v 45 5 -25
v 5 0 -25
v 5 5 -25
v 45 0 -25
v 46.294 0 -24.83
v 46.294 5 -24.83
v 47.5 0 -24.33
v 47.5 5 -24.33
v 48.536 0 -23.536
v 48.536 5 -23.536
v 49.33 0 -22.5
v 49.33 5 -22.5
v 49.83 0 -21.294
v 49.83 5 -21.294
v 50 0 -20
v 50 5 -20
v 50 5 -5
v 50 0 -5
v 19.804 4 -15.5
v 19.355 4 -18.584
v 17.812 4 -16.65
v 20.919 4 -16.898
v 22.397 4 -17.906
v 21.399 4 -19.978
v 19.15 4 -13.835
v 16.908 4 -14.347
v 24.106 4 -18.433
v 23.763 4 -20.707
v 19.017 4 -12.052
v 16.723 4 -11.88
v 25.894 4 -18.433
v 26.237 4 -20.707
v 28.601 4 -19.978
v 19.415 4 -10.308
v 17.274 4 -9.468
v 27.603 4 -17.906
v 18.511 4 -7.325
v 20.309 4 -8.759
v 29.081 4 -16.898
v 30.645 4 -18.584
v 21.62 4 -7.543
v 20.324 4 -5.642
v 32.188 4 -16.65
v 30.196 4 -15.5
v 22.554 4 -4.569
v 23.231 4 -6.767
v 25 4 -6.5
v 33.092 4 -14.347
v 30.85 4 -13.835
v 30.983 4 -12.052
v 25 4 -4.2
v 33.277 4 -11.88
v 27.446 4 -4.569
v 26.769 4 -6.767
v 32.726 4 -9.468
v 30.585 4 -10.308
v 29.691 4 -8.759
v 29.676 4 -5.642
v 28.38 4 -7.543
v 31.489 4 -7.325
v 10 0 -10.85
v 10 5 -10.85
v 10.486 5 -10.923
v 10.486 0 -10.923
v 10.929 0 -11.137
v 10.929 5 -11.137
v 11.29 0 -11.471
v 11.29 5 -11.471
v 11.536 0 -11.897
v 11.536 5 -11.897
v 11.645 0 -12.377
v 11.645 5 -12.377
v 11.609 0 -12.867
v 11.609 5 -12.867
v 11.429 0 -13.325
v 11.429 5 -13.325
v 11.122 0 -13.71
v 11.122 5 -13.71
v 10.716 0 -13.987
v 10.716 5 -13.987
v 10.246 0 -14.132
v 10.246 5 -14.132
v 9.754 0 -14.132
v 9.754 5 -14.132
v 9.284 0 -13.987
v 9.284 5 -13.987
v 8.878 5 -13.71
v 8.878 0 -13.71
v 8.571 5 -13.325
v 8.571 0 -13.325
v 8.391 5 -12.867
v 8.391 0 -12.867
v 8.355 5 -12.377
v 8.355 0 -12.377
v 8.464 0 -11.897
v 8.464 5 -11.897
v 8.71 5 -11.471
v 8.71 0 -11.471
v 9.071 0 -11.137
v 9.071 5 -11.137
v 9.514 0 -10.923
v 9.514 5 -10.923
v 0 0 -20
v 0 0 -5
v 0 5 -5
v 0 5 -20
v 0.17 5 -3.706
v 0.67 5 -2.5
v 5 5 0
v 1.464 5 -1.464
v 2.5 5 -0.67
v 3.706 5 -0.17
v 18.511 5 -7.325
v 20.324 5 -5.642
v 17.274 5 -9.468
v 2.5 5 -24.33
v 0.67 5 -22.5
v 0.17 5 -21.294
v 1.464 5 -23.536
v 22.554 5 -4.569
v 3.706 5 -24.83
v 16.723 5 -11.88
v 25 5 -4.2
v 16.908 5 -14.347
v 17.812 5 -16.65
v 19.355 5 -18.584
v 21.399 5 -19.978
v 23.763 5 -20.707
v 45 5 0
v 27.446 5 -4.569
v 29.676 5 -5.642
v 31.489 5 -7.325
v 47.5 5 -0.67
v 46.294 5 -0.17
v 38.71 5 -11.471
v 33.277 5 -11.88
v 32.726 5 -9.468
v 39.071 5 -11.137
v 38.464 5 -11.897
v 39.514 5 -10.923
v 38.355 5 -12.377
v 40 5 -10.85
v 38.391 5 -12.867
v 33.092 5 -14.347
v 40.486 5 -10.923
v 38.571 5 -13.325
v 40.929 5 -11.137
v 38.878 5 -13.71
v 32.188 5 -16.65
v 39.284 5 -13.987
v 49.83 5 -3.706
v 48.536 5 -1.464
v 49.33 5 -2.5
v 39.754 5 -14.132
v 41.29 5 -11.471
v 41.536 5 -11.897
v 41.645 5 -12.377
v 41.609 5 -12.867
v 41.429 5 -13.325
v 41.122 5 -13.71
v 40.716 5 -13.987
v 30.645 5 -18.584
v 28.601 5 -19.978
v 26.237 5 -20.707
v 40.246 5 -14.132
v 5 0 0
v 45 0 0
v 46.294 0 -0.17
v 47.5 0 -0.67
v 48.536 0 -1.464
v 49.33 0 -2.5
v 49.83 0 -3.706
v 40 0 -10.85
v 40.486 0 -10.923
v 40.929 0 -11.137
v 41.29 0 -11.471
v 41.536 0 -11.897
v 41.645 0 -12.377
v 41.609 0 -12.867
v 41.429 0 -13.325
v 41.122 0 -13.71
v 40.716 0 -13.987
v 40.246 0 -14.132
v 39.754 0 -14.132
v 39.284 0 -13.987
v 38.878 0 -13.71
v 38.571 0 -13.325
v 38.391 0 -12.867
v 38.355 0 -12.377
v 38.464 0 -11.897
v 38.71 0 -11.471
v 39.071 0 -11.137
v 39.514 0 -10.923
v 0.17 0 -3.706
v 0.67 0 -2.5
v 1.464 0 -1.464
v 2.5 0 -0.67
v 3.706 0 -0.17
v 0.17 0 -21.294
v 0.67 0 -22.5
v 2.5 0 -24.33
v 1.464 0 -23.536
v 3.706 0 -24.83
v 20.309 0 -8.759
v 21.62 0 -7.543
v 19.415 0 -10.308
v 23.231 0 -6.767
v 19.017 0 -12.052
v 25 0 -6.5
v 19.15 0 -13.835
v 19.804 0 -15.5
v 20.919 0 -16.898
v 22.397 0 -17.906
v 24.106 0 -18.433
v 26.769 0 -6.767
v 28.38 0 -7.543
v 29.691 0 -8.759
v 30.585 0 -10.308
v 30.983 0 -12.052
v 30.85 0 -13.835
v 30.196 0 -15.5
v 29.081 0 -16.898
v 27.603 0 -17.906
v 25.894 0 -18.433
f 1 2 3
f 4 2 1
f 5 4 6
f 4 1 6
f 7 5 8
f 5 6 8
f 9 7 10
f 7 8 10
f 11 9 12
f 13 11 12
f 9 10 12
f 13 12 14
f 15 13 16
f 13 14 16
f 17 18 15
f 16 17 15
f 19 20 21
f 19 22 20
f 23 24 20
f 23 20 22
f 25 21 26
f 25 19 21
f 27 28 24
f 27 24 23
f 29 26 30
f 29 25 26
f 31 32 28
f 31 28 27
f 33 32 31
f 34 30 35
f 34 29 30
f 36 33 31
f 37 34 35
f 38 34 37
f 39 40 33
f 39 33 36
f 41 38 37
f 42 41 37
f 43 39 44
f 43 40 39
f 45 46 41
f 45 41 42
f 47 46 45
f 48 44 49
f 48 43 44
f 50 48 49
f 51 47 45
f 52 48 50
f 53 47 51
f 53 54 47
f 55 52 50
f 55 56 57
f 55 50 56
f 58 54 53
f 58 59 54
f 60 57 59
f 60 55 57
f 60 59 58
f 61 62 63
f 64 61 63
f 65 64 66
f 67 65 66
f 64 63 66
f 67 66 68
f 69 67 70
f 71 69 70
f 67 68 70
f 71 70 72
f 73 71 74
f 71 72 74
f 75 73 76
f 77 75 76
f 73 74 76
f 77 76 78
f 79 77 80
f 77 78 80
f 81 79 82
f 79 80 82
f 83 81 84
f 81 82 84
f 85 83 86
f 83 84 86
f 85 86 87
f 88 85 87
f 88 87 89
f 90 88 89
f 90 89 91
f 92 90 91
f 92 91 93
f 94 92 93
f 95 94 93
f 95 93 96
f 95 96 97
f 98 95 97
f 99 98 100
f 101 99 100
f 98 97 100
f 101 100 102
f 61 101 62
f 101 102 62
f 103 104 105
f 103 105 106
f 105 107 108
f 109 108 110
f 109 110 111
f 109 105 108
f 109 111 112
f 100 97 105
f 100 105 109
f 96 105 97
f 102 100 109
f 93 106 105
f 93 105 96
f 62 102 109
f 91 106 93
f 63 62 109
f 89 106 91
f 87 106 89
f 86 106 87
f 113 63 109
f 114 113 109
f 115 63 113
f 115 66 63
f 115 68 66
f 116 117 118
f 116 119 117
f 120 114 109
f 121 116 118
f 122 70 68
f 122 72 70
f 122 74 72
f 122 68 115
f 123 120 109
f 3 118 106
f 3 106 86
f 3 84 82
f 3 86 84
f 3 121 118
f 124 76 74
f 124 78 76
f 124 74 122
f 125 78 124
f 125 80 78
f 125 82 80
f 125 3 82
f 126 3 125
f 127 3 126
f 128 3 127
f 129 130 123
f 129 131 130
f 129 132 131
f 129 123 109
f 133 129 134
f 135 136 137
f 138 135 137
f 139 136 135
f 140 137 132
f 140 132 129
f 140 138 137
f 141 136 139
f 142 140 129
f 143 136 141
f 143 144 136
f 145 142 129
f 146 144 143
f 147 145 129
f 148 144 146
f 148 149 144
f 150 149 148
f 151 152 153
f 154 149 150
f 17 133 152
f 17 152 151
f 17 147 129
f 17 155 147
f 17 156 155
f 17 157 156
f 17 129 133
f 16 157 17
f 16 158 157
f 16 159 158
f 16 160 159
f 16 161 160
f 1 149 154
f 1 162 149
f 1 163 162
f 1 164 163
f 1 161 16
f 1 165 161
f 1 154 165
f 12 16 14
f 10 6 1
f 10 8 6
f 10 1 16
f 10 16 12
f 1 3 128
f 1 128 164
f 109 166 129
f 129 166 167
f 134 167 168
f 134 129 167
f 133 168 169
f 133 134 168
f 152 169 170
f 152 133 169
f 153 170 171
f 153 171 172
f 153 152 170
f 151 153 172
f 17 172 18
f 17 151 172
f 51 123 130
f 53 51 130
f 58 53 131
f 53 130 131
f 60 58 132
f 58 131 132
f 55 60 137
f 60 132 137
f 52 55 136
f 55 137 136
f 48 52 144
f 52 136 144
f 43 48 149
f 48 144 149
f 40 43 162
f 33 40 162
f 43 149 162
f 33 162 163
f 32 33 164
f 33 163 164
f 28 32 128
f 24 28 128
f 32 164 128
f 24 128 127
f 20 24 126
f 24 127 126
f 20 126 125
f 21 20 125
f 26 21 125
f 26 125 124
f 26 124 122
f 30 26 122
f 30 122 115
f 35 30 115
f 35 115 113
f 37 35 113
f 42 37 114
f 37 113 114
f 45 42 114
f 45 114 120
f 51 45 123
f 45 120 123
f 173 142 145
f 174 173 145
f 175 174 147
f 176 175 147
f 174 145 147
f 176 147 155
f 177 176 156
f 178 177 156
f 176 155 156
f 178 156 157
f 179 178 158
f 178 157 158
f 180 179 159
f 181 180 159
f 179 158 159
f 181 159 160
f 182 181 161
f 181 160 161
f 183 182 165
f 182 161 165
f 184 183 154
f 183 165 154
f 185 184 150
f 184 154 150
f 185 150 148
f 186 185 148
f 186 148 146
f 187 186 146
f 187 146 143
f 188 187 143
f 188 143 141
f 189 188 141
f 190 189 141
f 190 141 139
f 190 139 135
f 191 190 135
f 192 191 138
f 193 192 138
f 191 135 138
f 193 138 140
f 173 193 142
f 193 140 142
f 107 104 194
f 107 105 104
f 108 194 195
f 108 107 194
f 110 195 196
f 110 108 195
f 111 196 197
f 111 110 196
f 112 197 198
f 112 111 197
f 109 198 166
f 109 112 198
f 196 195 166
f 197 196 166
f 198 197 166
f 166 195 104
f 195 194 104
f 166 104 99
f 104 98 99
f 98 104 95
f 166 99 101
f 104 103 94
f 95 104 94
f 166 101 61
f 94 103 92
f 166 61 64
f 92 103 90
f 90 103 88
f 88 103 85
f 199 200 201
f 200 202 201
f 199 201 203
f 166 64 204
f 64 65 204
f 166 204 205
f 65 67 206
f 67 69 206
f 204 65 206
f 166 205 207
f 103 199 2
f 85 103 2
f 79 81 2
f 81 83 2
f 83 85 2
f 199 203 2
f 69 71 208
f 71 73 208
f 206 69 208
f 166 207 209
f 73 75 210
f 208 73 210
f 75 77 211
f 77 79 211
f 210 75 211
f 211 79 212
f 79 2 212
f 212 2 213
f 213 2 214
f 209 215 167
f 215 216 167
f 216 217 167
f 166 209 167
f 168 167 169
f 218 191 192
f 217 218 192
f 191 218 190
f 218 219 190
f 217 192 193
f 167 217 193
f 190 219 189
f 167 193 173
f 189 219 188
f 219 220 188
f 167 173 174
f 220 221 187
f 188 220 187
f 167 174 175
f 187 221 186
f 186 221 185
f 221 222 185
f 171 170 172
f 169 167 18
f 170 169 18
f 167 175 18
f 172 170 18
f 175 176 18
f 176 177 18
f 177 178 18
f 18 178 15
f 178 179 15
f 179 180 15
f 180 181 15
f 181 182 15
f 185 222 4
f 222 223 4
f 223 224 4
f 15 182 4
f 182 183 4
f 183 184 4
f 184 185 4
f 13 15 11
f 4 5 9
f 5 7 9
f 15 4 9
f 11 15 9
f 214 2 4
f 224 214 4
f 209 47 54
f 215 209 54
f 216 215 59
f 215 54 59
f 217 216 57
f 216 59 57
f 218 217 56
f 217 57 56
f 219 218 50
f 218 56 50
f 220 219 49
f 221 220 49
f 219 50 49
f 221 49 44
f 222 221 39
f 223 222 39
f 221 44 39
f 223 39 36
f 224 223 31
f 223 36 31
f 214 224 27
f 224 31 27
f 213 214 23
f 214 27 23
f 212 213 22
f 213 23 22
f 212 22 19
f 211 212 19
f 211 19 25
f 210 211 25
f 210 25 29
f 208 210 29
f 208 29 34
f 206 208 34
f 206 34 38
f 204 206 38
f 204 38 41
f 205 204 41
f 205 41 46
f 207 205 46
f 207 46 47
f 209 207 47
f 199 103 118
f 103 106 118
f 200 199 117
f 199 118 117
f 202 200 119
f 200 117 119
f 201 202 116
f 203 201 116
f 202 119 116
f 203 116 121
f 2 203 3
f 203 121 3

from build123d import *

# Parameters (mm, degrees)
SKETCH_1_W          = 50
SKETCH_1_H          = 25
EXTRUDE_1_DEPTH     = 5
SKETCH_2_R          = 6
SKETCH_2_R_2        = 1.65
CUT_EXTRUDE_1_DEPTH = 5
SKETCH_4_R          = 8.3
CUT_EXTRUDE_2_DEPTH = 1
FILLET_1_R          = 5


with BuildPart() as part:
    # 草图1 → 凸台-拉伸1 (new body)
    with BuildSketch(Plane(origin=(0, 0, 0), x_dir=(1, 0, 0), z_dir=(0, 1, 0))):
        with Locations((25, 12.5)):
            Rectangle(SKETCH_1_W, SKETCH_1_H)
    extrude(amount=EXTRUDE_1_DEPTH)

    # 草图2 → 切除-拉伸1 (cut)
    with BuildSketch(Plane(origin=(0, 5, 0), x_dir=(1, 0, 0), z_dir=(0, 1, 0))):
        with Locations(Location((25, 12.5, 0), (0, 0, 270))):
            Circle(SKETCH_2_R)
        with Locations(Location((40, 12.5, 0), (0, 0, 270))):
            Circle(SKETCH_2_R_2)
        with Locations(Location((10, 12.5, 0), (0, 0, 270))):
            Circle(SKETCH_2_R_2)
    extrude(amount=-CUT_EXTRUDE_1_DEPTH, mode=Mode.SUBTRACT)

    # 草图4 → 切除-拉伸2 (cut)
    with BuildSketch(Plane(origin=(0, 5, 0), x_dir=(1, 0, 0), z_dir=(0, 1, 0))):
        with Locations(Location((25, 12.5, 0), (0, 0, 270))):
            Circle(SKETCH_4_R)
    extrude(amount=-CUT_EXTRUDE_2_DEPTH, mode=Mode.SUBTRACT)

    # 圆角1
    fillet_1_edges = [part.edges().sort_by_distance(p)[0] for p in [
        (0, 2.5, -25),
        (50, 2.5, -25),
        (50, 2.5, 0),
        (0, 2.5, 0),
    ]]
    fillet(fillet_1_edges, radius=FILLET_1_R)


solid = part.part
